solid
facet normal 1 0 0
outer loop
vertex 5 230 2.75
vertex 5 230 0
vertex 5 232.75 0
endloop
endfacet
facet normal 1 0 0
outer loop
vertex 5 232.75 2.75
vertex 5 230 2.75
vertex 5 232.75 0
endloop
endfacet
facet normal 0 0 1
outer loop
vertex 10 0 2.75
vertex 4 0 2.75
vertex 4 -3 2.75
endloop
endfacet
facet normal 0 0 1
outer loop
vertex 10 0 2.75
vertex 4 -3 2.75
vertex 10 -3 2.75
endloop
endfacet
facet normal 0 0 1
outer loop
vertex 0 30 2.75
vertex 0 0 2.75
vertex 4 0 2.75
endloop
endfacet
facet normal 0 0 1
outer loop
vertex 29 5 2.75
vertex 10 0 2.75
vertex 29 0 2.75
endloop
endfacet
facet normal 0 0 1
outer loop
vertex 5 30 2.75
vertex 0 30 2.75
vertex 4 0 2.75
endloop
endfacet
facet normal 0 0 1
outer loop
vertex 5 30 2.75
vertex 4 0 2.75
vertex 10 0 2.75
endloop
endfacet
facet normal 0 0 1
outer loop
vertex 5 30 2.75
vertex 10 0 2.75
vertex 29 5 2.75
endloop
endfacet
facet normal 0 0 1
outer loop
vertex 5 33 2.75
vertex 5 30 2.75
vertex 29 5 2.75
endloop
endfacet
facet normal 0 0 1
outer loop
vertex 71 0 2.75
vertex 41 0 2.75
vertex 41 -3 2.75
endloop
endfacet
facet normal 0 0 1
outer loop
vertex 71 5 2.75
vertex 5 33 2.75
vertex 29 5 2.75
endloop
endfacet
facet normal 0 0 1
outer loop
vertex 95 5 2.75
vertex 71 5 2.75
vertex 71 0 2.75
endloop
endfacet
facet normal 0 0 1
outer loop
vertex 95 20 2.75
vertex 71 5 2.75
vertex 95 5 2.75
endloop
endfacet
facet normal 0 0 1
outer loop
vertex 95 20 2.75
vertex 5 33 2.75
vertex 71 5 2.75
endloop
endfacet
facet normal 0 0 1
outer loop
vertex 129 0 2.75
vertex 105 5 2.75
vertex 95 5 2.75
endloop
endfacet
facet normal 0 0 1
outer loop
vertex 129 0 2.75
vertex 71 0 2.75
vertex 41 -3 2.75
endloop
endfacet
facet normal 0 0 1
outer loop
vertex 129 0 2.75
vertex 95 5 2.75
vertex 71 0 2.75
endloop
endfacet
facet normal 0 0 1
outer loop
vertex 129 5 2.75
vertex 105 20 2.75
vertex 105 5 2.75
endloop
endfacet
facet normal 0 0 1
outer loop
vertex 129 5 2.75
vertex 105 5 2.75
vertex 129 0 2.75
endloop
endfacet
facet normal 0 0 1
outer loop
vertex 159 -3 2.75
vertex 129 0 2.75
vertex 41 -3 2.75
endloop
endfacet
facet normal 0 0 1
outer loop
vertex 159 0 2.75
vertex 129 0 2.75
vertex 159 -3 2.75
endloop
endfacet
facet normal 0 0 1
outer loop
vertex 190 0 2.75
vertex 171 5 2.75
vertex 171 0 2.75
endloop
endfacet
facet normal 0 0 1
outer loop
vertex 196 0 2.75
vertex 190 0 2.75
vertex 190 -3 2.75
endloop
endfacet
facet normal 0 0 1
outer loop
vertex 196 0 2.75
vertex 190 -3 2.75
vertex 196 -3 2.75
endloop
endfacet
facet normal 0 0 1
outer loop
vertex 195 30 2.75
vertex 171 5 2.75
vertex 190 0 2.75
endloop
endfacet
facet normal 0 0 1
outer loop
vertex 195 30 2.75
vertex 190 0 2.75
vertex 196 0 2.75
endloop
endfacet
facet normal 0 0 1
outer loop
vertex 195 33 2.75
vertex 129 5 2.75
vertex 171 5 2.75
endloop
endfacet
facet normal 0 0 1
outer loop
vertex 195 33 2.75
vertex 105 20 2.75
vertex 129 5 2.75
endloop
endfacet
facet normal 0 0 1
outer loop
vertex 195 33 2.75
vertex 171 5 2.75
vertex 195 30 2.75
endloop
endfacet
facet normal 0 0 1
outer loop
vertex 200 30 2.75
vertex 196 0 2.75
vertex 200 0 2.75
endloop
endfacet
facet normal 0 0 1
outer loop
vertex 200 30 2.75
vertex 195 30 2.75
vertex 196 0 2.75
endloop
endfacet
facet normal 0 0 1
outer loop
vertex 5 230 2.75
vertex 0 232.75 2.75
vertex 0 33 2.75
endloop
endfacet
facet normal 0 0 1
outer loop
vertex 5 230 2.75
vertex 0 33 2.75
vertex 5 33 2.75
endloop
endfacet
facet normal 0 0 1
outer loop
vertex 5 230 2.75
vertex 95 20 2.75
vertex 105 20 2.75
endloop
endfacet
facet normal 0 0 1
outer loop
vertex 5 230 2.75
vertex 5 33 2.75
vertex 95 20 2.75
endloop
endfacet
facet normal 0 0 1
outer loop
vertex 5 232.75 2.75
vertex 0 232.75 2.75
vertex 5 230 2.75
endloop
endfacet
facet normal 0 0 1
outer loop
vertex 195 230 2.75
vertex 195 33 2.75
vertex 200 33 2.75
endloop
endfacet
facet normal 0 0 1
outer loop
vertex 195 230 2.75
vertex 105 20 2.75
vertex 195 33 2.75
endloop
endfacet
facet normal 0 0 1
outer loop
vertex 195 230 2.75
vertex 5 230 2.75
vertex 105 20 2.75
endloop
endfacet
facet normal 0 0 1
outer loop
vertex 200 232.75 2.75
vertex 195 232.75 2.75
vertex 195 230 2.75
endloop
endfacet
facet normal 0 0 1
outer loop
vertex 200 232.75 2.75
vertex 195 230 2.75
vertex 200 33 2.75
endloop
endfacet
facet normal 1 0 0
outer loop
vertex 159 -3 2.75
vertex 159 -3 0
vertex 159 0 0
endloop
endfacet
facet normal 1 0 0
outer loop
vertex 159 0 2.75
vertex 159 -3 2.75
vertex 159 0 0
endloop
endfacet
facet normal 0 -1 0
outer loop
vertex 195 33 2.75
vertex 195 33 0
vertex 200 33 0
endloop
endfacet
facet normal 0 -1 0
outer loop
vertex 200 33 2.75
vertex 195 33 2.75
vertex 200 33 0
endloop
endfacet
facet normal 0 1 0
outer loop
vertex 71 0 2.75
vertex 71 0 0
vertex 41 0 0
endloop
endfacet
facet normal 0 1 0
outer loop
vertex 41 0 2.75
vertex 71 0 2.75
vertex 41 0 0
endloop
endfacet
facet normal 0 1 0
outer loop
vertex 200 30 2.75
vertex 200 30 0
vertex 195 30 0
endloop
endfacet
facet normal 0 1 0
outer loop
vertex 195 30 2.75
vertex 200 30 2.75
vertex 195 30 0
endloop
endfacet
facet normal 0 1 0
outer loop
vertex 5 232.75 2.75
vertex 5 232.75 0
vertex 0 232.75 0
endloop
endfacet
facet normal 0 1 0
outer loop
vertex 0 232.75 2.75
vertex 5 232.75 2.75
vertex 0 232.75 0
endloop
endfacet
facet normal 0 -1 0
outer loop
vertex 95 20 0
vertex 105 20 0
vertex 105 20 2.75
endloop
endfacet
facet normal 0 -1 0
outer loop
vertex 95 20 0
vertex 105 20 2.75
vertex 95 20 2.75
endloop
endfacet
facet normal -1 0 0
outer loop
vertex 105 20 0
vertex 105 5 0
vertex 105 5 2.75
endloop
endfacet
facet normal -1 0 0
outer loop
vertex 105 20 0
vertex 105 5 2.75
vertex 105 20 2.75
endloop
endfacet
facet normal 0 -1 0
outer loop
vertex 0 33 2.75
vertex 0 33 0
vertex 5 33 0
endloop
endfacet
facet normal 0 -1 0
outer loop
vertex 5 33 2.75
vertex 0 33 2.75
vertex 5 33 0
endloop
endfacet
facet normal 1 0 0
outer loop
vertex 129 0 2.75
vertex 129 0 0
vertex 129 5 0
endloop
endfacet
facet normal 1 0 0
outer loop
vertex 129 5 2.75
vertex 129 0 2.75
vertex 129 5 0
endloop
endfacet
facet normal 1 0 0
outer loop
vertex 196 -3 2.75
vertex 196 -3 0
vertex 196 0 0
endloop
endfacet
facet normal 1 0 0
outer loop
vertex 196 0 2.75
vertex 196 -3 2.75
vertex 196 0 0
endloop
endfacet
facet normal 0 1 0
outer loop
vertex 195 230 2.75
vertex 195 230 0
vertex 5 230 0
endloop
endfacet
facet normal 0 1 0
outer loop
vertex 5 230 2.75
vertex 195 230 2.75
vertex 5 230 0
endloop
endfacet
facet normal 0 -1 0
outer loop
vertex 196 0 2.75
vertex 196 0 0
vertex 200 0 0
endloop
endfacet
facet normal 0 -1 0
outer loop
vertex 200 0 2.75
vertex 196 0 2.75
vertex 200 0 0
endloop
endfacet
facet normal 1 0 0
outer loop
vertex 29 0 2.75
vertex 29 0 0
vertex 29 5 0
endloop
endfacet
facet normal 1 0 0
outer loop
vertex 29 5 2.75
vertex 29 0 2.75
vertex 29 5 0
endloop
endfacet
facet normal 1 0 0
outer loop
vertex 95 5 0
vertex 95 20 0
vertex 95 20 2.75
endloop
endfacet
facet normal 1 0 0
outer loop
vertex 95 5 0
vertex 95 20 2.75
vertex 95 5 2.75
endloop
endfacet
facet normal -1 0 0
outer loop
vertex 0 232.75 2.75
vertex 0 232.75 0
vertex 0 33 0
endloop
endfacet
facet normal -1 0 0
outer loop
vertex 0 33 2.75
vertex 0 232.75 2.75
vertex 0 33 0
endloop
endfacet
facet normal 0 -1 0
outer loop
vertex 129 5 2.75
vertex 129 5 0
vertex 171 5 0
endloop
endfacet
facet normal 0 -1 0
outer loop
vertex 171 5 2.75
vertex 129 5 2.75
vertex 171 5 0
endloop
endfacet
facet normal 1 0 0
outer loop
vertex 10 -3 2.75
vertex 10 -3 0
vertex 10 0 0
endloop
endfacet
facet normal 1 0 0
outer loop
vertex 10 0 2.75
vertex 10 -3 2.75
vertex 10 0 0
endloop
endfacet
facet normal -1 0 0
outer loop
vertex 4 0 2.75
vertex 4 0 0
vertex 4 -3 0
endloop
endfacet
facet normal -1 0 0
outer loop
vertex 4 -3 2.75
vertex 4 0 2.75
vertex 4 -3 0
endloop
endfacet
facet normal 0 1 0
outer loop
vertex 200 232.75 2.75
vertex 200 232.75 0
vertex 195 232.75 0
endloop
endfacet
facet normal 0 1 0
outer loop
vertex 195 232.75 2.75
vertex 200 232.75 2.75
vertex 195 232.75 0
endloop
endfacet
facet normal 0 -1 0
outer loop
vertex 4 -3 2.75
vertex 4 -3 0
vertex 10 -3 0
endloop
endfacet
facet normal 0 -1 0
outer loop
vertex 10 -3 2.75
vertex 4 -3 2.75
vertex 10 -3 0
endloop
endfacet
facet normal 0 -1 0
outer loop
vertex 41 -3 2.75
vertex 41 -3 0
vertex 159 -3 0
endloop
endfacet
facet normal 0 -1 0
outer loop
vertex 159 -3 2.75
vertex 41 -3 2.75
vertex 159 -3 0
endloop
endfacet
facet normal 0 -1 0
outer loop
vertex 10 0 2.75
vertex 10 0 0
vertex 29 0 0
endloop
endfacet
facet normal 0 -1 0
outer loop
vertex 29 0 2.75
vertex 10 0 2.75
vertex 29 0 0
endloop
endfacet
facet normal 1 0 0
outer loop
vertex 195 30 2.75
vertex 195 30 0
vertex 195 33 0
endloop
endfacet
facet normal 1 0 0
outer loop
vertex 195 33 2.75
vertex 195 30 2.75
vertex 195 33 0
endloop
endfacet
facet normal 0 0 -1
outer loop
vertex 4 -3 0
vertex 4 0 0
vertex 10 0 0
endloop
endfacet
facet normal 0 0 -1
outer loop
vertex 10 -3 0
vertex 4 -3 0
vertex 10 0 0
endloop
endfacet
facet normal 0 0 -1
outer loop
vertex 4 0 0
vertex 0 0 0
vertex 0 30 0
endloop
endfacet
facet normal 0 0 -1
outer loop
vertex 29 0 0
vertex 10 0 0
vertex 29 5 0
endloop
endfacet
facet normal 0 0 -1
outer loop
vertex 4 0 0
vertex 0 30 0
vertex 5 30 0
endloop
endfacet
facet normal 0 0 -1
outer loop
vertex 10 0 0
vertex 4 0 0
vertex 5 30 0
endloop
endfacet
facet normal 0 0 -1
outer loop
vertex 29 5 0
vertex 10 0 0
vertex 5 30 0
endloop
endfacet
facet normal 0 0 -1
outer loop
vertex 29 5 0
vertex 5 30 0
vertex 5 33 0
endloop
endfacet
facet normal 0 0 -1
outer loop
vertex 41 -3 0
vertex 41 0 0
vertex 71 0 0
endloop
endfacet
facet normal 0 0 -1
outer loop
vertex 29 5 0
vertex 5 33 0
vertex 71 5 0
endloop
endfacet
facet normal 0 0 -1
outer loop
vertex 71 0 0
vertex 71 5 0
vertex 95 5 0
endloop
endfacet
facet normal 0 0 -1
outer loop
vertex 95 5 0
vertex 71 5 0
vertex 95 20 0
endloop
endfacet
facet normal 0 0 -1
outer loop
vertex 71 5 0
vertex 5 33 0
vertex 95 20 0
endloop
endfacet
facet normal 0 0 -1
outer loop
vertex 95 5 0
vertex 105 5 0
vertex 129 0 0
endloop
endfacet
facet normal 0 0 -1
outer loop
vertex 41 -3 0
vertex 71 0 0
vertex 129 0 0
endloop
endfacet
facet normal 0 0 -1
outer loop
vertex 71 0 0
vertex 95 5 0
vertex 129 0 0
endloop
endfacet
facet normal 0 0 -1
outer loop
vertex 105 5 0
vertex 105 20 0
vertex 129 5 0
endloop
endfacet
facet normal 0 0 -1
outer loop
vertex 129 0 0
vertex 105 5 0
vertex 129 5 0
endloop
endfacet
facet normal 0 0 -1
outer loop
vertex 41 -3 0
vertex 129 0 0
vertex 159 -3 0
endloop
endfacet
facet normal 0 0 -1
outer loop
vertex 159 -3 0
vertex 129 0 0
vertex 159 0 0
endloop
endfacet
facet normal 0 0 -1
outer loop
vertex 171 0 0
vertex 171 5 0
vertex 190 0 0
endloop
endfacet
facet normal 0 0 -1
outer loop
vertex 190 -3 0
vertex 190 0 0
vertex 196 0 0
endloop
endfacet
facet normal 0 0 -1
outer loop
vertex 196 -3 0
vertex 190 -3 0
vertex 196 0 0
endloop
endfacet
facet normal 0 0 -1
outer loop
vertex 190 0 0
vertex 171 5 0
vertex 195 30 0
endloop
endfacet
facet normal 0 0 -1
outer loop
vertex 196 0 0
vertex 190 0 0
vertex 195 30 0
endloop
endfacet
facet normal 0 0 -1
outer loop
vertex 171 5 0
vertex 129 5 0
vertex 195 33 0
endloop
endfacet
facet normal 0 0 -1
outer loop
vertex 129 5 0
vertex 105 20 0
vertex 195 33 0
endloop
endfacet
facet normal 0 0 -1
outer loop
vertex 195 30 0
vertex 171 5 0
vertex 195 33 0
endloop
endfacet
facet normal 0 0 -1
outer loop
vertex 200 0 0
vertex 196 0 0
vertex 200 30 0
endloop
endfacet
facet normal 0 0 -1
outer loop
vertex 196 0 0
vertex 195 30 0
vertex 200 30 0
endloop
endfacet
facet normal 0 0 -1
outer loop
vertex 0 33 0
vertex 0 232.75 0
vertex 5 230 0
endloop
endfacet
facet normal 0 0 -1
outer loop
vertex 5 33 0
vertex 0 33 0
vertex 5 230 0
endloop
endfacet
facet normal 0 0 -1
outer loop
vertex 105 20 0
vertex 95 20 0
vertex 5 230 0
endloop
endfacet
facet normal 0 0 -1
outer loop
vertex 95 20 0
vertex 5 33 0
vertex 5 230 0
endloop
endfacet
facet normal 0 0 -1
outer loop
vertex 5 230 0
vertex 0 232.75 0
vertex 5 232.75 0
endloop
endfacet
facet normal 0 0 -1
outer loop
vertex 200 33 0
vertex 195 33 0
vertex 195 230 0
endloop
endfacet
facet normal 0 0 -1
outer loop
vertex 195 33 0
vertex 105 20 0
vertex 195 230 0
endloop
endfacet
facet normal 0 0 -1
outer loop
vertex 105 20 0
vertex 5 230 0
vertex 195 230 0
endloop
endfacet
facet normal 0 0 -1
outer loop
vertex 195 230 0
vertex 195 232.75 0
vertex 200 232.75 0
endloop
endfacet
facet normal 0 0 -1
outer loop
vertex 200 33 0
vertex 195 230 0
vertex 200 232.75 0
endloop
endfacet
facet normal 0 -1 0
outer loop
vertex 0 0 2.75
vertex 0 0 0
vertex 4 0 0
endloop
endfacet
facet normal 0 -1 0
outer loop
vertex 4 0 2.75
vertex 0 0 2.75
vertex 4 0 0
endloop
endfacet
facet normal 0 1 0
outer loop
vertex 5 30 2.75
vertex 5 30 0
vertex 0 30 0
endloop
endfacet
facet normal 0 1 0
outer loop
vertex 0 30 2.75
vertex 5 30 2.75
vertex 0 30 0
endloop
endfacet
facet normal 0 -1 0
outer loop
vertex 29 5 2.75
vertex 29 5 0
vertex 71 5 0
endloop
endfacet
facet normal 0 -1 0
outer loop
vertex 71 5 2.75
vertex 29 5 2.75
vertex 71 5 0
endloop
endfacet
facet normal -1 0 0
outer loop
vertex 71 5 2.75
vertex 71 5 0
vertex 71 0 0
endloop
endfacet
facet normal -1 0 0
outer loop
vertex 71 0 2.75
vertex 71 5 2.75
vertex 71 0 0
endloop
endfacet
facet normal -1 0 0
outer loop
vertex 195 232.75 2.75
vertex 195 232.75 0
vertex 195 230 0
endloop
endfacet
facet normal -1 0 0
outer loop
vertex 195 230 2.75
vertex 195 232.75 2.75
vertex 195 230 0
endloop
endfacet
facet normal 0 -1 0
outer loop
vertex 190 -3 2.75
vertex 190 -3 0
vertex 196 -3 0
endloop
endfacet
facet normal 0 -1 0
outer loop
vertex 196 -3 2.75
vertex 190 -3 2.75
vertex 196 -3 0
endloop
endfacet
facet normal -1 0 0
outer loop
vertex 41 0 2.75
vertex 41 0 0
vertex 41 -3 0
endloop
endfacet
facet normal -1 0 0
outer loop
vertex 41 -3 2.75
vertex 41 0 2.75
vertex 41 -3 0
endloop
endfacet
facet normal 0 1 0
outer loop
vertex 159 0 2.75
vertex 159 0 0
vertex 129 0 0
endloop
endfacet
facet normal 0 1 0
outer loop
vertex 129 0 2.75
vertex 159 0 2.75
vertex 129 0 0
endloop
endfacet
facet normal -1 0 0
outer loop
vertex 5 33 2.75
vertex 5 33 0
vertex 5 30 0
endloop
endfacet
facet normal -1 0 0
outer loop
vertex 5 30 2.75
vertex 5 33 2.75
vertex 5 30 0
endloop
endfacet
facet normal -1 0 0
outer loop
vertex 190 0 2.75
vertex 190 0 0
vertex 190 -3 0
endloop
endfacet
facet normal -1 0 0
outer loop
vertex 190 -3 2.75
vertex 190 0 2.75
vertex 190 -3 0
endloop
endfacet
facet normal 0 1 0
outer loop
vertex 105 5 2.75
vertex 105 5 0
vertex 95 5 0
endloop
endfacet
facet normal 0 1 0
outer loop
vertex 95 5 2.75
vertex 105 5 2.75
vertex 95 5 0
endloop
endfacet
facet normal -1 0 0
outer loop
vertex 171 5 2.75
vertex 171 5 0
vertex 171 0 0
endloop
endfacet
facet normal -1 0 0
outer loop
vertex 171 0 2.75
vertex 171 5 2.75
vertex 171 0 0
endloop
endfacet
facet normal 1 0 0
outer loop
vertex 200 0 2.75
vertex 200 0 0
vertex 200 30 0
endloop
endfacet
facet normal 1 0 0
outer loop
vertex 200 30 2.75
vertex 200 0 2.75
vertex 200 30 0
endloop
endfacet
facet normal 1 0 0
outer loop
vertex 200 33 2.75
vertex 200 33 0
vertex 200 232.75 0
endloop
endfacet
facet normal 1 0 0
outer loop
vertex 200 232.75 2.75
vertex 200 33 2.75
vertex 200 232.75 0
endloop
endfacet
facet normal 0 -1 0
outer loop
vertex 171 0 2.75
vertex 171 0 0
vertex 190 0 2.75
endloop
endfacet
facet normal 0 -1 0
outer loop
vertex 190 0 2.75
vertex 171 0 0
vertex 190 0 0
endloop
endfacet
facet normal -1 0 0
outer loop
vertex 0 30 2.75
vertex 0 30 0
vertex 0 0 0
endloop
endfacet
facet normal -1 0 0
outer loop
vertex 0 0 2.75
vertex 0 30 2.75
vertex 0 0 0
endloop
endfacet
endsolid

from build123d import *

# Parameters (mm, degrees)
EXTRUDE_1_DEPTH = 2.75


with BuildPart() as part:
    # 草图1 → 凸台-拉伸1 (new body)
    with BuildSketch(Plane.XY):
        Polygon((200, 0), (200, 27), (200, 30), (195, 30), (195, 33), (200, 33), (200, 230), (200, 232.75), (195, 232.75), (195, 230), (5, 230), (5, 232.75), (0, 232.75), (0, 230), (0, 33), (5, 33), (5, 30), (0, 30), (0, 27), (0, 0), (4, 0), (4, -3), (10, -3), (10, 0), (29, 0), (29, 5), (71, 5), (71, 0), (41, 0), (41, -3), (159, -3), (159, 0), (129, 0), (129, 5), (171, 5), (171, 0), (190, 0), (190, -3), (196, -3), (196, 0), align=None)
        Polygon((95, 5), (100, 5), (105, 5), (105, 20), (95, 20), align=None, mode=Mode.SUBTRACT)
    extrude(amount=EXTRUDE_1_DEPTH)


solid = part.part
